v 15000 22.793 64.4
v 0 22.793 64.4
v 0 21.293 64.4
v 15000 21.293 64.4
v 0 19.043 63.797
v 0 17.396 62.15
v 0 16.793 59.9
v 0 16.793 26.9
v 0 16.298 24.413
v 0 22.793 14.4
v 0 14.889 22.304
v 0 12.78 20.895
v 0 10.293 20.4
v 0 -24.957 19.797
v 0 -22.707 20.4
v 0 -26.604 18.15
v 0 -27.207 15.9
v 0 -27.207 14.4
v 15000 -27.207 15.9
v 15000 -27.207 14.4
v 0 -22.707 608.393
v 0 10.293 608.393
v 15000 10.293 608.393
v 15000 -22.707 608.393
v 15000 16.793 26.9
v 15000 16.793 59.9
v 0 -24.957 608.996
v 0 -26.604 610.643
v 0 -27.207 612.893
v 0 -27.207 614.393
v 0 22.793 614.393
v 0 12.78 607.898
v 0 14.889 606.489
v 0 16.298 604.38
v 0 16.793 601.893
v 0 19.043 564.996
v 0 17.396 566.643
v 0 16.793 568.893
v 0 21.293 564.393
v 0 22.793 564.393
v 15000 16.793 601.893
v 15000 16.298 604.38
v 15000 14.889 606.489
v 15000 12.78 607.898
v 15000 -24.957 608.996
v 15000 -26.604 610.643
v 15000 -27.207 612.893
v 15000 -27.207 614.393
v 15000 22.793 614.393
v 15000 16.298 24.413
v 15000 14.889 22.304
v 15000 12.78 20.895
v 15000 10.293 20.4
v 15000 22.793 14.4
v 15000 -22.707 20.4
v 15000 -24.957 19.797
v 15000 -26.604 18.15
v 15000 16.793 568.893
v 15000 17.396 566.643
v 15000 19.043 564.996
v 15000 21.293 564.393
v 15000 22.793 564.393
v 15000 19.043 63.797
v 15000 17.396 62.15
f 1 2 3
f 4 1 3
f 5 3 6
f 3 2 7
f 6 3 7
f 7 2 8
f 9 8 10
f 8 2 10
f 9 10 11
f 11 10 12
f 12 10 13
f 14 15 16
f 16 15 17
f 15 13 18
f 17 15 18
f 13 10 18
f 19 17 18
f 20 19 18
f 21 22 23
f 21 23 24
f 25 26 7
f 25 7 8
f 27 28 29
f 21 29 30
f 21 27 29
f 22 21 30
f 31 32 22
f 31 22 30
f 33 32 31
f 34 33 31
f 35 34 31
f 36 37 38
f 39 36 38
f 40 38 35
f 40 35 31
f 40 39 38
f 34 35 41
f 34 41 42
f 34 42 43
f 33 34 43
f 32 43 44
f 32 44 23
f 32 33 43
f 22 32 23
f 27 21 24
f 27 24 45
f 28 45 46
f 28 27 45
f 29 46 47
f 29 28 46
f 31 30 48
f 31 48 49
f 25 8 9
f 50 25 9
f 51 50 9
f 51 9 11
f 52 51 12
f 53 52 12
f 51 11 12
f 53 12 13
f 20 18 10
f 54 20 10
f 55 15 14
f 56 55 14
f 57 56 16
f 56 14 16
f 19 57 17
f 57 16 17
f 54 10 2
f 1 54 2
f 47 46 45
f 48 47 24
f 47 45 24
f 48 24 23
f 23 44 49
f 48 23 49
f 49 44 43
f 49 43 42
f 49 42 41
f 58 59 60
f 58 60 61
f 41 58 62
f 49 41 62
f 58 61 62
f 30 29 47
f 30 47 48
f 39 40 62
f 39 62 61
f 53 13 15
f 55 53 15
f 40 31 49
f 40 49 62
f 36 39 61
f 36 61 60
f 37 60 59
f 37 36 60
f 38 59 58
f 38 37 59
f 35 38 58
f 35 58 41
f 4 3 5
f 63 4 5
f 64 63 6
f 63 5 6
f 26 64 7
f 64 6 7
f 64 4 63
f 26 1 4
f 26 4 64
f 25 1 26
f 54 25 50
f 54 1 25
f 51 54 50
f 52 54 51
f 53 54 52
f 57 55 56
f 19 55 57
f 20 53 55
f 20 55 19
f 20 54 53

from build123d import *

# Parameters (mm, degrees)
EXTRUDE017_DEPTH = 15000
EXTRUDE018_DEPTH = 15000


with BuildPart() as extrude017:
    # AngleSteel005 → Extrude017 (new body)
    with BuildSketch(Plane(origin=(0, 43.196342, 28.796342), x_dir=(0, 1, 0), z_dir=(-1, 0, 0))):
        with BuildLine():
            Line((-14.396342, 14.396342), (-14.396342, -35.603658))
            Line((-14.396342, -35.603658), (-12.896342, -35.603658))
            ThreePointArc((-12.896342, -35.603658), (-9.714361, -34.285639), (-8.396342, -31.103658))
            Line((-8.396342, -31.103658), (-8.396342, 1.896342))
            ThreePointArc((-8.396342, 1.896342), (-6.492536, 6.492536), (-1.896342, 8.396342))
            Line((-1.896342, 8.396342), (31.103658, 8.396342))
            ThreePointArc((31.103658, 8.396342), (34.285639, 9.714361), (35.603658, 12.896342))
            Line((35.603658, 12.896342), (35.603658, 14.396342))
            Line((35.603658, 14.396342), (-14.396342, 14.396342))
        make_face()
    extrude(amount=-EXTRUDE017_DEPTH)


with BuildPart() as fusion001:
    # Mirror011 → Extrude018 (new body)
    with BuildSketch(Plane(origin=(0, 43.196342, 599.996342), x_dir=(0, -1, 0), z_dir=(1, 0, 0))):
        with BuildLine():
            Line((14.396342, -14.396342), (14.396342, 35.603658))
            Line((14.396342, 35.603658), (12.896342, 35.603658))
            ThreePointArc((12.896342, 35.603658), (9.714361, 34.285639), (8.396342, 31.103658))
            Line((8.396342, 31.103658), (8.396342, -1.896342))
            ThreePointArc((8.396342, -1.896342), (6.492536, -6.492536), (1.896342, -8.396342))
            Line((1.896342, -8.396342), (-31.103658, -8.396342))
            ThreePointArc((-31.103658, -8.396342), (-34.285639, -9.714361), (-35.603658, -12.896342))
            Line((-35.603658, -12.896342), (-35.603658, -14.396342))
            Line((-35.603658, -14.396342), (14.396342, -14.396342))
        make_face()
    extrude(amount=EXTRUDE018_DEPTH)

    # Fusion001: union Extrude017
    add(extrude017.part)


with BuildPart() as fusion_mirrored:
    # Mirror001: instance of Fusion001
    add(fusion001.part.mirror(Plane(origin=(0, 28.796342, 514.396342), x_dir=(-1, 0, 0), z_dir=(0, -1, 0))))


with BuildPart() as fusion_mirrored_1:
    # Mirror001 placement: moved
    add(fusion_mirrored.part.moved(Location((0, -6, 0))))


solid = fusion_mirrored_1.part
